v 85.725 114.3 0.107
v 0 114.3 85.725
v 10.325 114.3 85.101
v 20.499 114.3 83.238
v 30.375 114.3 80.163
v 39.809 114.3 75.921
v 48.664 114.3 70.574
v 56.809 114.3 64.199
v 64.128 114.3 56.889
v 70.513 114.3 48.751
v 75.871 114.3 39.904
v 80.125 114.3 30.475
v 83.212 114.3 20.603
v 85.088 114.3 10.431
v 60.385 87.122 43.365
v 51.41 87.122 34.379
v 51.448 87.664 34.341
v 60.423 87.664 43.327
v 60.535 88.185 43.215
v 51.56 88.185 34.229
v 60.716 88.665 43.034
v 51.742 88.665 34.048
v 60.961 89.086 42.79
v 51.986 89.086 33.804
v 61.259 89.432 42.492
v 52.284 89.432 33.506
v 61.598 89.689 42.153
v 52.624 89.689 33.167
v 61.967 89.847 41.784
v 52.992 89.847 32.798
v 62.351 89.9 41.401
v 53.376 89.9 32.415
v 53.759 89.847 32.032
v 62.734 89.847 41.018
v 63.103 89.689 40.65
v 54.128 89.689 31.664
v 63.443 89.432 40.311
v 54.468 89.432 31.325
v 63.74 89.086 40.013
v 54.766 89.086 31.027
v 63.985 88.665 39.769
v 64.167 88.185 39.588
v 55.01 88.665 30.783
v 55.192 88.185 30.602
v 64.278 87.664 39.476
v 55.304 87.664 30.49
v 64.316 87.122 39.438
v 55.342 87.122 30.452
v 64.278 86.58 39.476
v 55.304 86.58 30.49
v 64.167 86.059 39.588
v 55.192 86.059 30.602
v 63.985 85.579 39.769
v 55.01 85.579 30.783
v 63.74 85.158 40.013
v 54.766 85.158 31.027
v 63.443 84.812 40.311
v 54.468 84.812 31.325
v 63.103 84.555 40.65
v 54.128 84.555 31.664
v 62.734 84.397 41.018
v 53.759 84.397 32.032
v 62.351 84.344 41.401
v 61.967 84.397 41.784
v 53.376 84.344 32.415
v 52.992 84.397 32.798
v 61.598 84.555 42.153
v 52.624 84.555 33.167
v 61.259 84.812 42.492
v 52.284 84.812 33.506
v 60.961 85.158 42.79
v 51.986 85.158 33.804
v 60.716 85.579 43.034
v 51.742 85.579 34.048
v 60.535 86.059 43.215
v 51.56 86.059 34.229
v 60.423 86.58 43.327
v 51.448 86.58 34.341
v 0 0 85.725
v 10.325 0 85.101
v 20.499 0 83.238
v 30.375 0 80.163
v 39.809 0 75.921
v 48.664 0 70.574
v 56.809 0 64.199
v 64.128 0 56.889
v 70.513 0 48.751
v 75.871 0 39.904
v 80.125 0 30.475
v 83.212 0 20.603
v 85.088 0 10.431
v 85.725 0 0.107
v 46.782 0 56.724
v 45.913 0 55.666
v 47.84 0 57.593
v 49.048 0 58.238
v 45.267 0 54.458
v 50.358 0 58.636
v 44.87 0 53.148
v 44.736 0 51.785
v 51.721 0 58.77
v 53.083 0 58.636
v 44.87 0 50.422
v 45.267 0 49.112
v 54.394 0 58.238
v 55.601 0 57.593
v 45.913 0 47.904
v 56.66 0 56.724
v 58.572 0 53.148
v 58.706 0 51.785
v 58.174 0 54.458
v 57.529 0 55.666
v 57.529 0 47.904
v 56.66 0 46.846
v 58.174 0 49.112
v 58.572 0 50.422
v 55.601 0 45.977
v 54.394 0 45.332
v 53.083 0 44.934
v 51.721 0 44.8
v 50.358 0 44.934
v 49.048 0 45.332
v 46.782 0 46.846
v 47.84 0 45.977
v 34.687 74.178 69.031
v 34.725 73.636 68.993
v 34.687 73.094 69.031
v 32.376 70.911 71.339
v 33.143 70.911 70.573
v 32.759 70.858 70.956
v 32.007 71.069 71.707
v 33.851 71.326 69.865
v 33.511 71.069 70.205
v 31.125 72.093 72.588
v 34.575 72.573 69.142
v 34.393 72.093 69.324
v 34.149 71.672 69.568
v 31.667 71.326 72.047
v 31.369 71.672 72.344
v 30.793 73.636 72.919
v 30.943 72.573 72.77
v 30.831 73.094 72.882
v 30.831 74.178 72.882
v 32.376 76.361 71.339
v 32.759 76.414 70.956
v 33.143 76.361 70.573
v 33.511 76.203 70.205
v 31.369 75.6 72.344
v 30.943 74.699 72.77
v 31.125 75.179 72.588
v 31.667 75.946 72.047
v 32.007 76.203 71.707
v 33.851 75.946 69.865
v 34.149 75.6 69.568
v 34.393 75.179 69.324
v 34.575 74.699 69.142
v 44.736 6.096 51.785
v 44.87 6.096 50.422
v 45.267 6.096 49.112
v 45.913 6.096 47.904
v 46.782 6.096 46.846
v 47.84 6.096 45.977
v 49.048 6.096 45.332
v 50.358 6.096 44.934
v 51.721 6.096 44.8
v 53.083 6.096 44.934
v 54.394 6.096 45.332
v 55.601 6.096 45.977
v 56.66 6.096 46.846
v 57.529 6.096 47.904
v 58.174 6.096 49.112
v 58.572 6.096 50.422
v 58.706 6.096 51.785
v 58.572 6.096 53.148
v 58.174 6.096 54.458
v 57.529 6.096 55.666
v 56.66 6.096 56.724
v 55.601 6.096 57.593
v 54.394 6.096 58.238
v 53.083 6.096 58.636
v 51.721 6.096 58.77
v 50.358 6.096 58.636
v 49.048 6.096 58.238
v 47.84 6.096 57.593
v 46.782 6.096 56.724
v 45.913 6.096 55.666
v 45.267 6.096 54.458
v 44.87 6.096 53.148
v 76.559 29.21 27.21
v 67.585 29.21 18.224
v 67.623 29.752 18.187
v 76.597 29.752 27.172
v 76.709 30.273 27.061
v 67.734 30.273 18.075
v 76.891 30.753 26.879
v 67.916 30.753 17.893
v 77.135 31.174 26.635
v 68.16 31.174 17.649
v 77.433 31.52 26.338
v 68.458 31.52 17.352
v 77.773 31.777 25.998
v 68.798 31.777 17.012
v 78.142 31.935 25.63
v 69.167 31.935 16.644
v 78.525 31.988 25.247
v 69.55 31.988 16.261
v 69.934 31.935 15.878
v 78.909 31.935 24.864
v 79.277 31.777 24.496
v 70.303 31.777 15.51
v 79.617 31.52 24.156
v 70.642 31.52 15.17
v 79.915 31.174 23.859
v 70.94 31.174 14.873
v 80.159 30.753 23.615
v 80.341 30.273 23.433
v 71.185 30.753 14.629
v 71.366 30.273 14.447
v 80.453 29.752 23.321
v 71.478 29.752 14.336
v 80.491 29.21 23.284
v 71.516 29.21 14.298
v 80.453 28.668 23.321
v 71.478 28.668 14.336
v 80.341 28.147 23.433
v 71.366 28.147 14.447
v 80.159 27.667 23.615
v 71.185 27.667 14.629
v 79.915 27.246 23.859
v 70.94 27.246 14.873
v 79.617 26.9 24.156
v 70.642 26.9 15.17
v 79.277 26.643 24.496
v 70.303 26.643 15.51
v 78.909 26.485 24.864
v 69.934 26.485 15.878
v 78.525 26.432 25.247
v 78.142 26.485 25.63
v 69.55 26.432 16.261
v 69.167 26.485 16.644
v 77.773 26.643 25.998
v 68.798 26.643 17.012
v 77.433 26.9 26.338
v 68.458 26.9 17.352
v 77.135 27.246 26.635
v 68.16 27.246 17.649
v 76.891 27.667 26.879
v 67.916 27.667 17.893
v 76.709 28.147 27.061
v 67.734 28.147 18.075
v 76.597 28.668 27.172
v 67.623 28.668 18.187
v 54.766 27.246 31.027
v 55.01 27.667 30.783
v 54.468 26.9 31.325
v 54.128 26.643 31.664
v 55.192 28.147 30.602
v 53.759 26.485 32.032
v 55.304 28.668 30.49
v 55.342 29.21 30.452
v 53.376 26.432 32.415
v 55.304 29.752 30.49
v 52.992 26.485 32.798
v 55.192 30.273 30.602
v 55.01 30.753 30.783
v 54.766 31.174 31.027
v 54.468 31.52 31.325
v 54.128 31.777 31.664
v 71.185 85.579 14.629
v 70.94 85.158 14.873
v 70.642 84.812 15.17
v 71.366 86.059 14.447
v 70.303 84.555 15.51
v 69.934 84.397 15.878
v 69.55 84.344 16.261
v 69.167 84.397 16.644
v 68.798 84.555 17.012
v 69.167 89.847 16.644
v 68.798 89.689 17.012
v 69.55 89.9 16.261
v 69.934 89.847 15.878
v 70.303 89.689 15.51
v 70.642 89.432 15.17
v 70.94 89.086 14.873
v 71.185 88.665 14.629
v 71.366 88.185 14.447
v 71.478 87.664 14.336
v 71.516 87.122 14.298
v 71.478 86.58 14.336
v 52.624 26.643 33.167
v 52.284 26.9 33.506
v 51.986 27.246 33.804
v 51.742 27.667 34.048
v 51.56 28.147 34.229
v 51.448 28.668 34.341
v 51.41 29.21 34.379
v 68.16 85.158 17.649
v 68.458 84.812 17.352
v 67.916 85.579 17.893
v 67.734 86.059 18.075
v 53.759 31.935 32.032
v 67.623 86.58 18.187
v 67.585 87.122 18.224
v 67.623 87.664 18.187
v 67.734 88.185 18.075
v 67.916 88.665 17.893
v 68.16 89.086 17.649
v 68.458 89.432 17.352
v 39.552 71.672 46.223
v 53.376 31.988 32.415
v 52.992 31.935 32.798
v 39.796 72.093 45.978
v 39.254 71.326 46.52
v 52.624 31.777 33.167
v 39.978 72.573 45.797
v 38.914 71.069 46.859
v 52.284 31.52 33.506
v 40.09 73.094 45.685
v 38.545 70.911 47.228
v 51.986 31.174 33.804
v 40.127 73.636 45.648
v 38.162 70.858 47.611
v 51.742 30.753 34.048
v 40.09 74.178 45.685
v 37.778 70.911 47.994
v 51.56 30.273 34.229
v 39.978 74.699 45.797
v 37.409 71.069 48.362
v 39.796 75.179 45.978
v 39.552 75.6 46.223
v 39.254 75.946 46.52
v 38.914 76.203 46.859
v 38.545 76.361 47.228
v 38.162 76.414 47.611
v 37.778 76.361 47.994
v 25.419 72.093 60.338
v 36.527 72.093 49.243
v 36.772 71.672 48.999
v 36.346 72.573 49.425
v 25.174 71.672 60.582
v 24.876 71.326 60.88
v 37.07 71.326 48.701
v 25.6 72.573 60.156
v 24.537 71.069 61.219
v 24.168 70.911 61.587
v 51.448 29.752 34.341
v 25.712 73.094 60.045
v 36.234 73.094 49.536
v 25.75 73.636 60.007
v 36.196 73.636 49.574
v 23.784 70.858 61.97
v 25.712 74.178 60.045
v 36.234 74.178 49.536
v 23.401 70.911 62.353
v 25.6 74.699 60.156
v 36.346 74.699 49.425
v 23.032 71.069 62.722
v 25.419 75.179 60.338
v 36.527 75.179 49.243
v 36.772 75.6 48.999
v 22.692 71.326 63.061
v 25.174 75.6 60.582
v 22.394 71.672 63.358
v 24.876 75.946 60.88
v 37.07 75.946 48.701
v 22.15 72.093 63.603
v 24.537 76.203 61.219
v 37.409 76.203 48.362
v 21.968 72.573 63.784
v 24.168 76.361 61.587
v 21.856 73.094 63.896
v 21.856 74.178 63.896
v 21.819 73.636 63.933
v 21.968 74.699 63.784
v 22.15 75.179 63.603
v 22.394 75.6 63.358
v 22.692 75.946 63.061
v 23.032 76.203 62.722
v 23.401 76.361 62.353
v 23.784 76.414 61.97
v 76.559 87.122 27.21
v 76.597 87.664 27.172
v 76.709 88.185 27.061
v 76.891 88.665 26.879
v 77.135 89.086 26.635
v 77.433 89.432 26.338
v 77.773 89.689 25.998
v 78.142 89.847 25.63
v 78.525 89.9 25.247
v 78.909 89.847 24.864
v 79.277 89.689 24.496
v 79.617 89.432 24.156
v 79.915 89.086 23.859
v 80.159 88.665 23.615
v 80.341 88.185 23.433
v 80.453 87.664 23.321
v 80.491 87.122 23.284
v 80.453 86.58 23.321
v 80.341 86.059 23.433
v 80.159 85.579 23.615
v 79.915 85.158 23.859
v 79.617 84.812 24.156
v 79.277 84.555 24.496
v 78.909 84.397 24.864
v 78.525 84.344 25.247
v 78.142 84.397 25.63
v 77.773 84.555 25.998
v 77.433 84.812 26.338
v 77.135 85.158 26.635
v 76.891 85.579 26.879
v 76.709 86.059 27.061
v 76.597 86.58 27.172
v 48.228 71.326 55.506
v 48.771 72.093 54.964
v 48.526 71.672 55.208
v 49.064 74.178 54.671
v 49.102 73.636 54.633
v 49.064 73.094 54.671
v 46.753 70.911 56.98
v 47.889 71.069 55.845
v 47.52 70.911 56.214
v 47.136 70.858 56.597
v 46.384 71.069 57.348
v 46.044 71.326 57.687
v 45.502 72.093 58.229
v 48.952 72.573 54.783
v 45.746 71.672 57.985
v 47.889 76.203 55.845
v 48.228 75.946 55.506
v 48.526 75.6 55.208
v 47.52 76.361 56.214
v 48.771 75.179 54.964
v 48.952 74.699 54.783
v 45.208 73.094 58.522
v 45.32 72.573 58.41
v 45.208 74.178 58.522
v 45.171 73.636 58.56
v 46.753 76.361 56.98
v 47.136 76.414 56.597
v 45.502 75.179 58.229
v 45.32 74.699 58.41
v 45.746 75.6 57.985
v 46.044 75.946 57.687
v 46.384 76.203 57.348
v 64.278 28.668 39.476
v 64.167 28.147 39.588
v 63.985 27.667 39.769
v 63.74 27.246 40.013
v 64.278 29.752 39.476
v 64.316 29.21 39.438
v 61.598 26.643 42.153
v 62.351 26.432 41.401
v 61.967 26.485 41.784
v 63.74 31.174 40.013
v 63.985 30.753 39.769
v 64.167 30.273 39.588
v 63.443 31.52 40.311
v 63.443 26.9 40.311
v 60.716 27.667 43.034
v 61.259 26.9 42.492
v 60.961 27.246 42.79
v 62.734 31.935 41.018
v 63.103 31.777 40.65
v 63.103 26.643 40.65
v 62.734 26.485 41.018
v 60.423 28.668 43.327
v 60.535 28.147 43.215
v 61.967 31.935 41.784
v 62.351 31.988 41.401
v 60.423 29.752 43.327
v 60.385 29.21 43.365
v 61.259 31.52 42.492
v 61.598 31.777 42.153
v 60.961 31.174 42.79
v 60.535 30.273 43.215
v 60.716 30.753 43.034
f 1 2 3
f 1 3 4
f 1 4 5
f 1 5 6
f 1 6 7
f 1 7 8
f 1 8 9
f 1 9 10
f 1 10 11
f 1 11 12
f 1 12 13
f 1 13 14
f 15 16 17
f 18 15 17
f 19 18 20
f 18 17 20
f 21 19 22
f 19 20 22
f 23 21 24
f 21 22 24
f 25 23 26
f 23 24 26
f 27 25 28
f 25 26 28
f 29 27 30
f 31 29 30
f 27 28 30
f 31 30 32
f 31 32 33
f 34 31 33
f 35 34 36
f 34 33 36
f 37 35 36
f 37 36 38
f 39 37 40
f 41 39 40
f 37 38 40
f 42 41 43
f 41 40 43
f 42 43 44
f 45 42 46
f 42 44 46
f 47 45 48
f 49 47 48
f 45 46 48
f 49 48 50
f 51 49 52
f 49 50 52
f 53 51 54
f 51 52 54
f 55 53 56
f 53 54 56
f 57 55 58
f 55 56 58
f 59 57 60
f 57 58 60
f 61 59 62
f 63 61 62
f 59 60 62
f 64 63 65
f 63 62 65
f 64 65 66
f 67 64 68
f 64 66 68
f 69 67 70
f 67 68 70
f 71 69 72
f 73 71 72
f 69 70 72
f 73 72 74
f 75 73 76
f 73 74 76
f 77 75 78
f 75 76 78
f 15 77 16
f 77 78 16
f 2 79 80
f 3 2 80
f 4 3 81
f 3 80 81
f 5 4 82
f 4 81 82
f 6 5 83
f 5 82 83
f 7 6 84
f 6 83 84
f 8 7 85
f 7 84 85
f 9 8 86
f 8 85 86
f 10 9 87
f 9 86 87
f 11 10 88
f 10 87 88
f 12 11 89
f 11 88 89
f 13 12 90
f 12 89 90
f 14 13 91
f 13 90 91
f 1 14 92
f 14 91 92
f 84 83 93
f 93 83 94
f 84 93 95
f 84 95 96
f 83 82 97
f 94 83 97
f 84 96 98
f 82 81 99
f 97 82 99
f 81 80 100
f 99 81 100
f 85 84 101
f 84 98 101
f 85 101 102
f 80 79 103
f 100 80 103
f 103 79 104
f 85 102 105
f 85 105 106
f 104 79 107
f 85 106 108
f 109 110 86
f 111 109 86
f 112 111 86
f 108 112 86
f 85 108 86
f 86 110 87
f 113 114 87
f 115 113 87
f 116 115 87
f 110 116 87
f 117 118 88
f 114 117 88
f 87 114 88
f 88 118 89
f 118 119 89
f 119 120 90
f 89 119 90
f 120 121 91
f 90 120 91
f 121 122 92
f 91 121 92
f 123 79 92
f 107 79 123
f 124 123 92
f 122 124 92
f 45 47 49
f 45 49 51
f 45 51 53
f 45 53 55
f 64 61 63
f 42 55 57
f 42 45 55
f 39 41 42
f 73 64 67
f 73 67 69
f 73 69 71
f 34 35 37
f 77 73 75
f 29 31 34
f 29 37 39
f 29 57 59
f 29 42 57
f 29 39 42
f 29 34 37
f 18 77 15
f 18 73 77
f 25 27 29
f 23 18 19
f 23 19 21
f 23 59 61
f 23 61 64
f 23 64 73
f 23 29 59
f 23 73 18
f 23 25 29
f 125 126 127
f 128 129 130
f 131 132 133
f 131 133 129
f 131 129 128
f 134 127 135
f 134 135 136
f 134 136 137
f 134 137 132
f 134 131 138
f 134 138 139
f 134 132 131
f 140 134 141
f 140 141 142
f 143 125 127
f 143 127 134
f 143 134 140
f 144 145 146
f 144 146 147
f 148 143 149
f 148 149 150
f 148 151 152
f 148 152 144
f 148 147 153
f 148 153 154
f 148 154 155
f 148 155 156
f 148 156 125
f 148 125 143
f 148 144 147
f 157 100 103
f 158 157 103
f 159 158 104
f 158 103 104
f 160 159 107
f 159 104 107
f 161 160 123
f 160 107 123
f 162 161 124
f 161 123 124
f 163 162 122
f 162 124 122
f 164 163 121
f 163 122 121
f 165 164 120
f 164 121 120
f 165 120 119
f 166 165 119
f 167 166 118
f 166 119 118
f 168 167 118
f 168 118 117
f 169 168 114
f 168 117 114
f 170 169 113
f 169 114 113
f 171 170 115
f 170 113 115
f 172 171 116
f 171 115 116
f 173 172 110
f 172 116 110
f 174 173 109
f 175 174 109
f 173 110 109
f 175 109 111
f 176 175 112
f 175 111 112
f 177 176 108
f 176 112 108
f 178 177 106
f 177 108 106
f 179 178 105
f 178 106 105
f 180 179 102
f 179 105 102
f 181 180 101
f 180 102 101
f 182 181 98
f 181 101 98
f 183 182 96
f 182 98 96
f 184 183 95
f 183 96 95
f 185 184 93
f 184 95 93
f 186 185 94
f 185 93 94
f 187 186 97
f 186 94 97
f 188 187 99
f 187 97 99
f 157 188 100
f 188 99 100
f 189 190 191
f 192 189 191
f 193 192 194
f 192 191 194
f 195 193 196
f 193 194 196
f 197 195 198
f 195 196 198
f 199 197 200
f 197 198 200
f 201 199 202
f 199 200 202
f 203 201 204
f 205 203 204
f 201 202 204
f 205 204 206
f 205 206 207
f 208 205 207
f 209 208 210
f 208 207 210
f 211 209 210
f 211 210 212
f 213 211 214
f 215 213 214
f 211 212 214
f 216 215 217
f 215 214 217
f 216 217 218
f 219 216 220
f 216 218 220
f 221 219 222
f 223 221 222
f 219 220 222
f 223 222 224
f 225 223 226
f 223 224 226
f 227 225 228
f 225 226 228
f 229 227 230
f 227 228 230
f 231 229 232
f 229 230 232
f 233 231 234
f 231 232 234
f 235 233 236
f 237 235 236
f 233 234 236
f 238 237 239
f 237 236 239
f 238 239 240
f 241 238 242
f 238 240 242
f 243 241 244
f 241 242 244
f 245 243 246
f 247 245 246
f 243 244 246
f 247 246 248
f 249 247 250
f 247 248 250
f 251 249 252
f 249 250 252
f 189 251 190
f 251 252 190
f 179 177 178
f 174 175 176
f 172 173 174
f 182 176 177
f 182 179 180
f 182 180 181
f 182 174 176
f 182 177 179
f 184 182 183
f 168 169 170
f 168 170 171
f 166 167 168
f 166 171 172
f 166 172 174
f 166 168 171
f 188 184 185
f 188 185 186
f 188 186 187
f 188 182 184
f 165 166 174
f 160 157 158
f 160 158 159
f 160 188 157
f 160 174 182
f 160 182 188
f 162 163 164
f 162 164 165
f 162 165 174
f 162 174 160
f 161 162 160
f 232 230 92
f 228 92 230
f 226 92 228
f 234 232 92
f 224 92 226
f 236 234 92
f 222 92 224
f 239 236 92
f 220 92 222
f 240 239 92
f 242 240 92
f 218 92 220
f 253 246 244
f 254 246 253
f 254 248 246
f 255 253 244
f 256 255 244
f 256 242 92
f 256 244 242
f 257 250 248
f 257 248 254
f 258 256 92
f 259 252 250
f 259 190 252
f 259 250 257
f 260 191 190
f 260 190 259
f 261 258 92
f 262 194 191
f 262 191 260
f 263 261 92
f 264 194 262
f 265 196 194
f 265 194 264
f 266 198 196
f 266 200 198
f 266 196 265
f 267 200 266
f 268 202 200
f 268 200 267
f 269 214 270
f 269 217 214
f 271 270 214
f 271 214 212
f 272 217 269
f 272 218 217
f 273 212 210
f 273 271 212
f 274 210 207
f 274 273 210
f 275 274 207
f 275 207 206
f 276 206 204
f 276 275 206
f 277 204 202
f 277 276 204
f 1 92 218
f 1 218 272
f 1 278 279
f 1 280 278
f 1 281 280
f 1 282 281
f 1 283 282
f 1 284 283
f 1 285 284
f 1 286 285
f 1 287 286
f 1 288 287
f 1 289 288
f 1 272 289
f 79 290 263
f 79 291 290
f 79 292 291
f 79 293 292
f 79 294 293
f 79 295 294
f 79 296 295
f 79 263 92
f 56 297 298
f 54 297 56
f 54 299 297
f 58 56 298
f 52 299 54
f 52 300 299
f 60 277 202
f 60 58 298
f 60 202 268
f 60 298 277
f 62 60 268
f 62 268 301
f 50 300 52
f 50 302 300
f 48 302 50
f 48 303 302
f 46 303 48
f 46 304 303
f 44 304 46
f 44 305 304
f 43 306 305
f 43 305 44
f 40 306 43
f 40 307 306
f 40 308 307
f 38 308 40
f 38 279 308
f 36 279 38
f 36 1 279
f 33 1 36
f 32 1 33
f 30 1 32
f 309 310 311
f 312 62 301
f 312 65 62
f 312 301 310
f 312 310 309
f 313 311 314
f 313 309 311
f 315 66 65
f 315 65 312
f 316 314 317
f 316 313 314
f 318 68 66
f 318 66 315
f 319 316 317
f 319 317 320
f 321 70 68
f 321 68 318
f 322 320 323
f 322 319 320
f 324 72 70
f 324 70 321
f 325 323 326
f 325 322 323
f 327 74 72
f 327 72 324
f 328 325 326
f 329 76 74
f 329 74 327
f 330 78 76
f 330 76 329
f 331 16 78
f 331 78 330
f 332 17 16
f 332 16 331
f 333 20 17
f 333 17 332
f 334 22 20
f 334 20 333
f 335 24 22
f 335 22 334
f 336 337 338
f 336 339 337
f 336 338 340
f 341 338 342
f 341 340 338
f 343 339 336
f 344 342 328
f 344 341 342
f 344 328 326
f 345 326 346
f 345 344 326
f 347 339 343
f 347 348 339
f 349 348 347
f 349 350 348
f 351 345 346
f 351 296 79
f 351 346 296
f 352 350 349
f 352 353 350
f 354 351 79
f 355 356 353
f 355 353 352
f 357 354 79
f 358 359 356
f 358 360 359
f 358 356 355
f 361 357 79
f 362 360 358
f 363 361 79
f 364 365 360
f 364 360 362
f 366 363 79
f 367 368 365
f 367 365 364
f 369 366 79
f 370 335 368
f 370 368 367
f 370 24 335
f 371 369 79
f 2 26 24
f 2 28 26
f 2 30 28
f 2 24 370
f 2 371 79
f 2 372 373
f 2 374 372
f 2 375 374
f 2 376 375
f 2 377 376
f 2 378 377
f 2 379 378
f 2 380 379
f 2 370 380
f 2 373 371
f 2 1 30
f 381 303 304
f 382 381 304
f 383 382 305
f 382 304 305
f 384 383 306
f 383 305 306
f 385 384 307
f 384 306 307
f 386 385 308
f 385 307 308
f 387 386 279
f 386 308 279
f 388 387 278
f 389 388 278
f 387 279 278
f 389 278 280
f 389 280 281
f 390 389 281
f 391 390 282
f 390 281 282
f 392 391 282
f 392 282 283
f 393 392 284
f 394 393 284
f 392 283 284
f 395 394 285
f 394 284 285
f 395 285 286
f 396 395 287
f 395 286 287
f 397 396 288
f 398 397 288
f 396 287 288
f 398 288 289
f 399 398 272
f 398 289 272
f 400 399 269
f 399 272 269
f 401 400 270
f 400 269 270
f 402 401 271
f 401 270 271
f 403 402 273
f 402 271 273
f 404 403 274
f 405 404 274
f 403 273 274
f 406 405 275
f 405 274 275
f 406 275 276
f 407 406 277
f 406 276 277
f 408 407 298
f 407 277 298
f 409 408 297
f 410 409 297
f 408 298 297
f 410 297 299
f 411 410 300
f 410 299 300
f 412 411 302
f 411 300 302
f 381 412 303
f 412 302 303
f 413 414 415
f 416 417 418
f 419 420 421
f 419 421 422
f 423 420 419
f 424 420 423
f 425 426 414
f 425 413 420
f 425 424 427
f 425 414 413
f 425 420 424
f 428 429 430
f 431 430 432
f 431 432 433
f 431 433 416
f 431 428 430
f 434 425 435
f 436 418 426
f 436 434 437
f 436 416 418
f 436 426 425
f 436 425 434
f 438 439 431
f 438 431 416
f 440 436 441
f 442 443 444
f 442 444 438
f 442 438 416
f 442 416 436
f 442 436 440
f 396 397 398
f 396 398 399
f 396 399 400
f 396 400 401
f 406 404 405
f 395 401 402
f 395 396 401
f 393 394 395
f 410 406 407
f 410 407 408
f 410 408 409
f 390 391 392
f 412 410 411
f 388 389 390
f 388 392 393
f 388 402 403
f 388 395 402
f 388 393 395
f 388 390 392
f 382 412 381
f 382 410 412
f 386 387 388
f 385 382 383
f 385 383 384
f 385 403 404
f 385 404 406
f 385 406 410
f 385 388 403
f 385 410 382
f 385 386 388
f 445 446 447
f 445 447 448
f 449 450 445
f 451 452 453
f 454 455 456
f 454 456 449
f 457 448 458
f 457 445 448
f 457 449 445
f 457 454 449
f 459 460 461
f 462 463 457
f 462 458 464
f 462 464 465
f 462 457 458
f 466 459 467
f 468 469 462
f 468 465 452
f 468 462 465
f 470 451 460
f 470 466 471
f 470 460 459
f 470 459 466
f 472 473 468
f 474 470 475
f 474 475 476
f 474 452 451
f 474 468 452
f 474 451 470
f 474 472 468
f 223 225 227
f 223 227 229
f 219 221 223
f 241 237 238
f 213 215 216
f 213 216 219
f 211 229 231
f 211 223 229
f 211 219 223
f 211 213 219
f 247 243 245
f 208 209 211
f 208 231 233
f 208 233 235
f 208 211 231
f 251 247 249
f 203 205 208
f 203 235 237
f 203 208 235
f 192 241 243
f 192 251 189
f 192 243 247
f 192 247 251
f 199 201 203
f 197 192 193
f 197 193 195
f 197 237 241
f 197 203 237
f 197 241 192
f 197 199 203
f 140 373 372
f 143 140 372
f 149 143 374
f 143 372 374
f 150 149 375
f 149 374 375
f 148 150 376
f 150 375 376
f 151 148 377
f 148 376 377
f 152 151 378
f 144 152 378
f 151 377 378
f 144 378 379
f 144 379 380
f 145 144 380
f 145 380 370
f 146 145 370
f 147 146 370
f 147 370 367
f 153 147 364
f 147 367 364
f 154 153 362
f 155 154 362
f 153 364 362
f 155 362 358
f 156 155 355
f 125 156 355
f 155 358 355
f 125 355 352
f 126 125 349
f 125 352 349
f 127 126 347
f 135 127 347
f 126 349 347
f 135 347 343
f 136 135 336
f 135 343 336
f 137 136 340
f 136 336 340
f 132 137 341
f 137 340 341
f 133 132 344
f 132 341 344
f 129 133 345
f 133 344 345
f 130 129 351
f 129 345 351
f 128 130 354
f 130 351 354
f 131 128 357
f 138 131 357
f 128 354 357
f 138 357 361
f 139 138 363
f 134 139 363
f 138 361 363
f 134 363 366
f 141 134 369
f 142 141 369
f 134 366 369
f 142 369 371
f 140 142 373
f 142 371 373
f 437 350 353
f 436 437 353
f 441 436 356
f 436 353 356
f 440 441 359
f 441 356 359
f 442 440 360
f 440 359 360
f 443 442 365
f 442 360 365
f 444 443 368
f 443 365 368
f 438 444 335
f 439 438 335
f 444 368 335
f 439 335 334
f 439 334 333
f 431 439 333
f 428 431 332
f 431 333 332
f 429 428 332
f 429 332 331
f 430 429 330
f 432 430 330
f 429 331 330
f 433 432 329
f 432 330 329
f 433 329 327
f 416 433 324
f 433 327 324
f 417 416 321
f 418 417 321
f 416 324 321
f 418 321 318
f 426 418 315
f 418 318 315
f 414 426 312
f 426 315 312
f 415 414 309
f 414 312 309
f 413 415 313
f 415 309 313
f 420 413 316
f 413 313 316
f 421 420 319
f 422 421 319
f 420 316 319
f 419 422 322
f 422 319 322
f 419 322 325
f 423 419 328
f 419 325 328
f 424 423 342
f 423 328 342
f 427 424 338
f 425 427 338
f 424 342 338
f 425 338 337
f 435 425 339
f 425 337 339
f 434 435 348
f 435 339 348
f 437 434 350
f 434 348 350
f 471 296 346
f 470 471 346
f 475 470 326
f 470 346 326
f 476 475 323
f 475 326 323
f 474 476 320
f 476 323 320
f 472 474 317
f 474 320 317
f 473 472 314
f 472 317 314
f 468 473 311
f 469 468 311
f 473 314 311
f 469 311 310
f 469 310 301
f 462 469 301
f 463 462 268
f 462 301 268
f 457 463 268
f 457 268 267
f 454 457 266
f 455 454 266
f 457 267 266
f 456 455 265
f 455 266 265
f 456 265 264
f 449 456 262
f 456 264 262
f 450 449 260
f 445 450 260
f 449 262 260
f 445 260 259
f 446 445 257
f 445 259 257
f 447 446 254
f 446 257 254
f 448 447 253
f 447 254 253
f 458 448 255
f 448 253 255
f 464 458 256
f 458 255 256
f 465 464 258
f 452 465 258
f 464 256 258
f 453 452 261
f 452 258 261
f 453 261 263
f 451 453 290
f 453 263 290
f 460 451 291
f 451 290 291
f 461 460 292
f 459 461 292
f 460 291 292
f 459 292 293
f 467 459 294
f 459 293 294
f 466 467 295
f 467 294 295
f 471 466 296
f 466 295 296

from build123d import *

# Parameters (mm, degrees)
SKETCH1_R           = 85.725
BOSS_EXTRUDE1_DEPTH = 114.3
CUT_EXTRUDE1_DEPTH  = 152.4
SKETCH3_R           = 2.778125
CUT_EXTRUDE2_DEPTH  = 12.7
SKETCH4_R           = 6.985
CUT_EXTRUDE3_DEPTH  = 6.096


with BuildPart() as part:
    # Sketch1 → Boss-Extrude1 (new body)
    with BuildSketch(Plane(origin=(0, 0, 0), x_dir=(1, 0, 0), z_dir=(0, 1, 0))):
        Circle(SKETCH1_R)
    extrude(amount=BOSS_EXTRUDE1_DEPTH)

    # Sketch2 → Cut-Extrude1 (cut)
    with BuildSketch(Plane(origin=(0, 114.3, 0), x_dir=(1, 0, 0), z_dir=(0, 1, 0))):
        Polygon((85.724933621, -0.10668), (0, -85.725), (-45.627504124, -96.719379999), (-137.428949547, 46.173941299), (19.12530113, 101.910533163), (109.833872203, 30.600481808), align=None)
    extrude(amount=-CUT_EXTRUDE1_DEPTH, mode=Mode.SUBTRACT)

    # Sketch3 → Cut-Extrude2 (cut)
    with BuildSketch(Plane(origin=(42.862466811, 0, 42.91584), x_dir=(-0.707546622, 0, 0.706666667), z_dir=(-0.706666667, 0, -0.707546622))):
        with Locations((-37.719, 87.122)):
            Circle(SKETCH3_R)
        with Locations((-14.859, 87.122)):
            Circle(SKETCH3_R)
        with Locations((-37.719, 29.21)):
            Circle(SKETCH3_R)
        with Locations((-14.859, 29.21)):
            Circle(SKETCH3_R)
        with Locations((6.643736743, 73.636006083)):
            Circle(SKETCH3_R)
        with Locations((26.963736743, 73.636006083)):
            Circle(SKETCH3_R)
    extrude(amount=-CUT_EXTRUDE2_DEPTH, mode=Mode.SUBTRACT)

    # Sketch4 → Cut-Extrude3 (cut)
    with BuildSketch(Plane(origin=(0, 0, 0), x_dir=(-1, 0, 0), z_dir=(0, -1, 0))):
        with Locations((-51.720733405, -51.785137083)):
            Circle(SKETCH4_R)
    extrude(amount=-CUT_EXTRUDE3_DEPTH, mode=Mode.SUBTRACT)


solid = part.part
